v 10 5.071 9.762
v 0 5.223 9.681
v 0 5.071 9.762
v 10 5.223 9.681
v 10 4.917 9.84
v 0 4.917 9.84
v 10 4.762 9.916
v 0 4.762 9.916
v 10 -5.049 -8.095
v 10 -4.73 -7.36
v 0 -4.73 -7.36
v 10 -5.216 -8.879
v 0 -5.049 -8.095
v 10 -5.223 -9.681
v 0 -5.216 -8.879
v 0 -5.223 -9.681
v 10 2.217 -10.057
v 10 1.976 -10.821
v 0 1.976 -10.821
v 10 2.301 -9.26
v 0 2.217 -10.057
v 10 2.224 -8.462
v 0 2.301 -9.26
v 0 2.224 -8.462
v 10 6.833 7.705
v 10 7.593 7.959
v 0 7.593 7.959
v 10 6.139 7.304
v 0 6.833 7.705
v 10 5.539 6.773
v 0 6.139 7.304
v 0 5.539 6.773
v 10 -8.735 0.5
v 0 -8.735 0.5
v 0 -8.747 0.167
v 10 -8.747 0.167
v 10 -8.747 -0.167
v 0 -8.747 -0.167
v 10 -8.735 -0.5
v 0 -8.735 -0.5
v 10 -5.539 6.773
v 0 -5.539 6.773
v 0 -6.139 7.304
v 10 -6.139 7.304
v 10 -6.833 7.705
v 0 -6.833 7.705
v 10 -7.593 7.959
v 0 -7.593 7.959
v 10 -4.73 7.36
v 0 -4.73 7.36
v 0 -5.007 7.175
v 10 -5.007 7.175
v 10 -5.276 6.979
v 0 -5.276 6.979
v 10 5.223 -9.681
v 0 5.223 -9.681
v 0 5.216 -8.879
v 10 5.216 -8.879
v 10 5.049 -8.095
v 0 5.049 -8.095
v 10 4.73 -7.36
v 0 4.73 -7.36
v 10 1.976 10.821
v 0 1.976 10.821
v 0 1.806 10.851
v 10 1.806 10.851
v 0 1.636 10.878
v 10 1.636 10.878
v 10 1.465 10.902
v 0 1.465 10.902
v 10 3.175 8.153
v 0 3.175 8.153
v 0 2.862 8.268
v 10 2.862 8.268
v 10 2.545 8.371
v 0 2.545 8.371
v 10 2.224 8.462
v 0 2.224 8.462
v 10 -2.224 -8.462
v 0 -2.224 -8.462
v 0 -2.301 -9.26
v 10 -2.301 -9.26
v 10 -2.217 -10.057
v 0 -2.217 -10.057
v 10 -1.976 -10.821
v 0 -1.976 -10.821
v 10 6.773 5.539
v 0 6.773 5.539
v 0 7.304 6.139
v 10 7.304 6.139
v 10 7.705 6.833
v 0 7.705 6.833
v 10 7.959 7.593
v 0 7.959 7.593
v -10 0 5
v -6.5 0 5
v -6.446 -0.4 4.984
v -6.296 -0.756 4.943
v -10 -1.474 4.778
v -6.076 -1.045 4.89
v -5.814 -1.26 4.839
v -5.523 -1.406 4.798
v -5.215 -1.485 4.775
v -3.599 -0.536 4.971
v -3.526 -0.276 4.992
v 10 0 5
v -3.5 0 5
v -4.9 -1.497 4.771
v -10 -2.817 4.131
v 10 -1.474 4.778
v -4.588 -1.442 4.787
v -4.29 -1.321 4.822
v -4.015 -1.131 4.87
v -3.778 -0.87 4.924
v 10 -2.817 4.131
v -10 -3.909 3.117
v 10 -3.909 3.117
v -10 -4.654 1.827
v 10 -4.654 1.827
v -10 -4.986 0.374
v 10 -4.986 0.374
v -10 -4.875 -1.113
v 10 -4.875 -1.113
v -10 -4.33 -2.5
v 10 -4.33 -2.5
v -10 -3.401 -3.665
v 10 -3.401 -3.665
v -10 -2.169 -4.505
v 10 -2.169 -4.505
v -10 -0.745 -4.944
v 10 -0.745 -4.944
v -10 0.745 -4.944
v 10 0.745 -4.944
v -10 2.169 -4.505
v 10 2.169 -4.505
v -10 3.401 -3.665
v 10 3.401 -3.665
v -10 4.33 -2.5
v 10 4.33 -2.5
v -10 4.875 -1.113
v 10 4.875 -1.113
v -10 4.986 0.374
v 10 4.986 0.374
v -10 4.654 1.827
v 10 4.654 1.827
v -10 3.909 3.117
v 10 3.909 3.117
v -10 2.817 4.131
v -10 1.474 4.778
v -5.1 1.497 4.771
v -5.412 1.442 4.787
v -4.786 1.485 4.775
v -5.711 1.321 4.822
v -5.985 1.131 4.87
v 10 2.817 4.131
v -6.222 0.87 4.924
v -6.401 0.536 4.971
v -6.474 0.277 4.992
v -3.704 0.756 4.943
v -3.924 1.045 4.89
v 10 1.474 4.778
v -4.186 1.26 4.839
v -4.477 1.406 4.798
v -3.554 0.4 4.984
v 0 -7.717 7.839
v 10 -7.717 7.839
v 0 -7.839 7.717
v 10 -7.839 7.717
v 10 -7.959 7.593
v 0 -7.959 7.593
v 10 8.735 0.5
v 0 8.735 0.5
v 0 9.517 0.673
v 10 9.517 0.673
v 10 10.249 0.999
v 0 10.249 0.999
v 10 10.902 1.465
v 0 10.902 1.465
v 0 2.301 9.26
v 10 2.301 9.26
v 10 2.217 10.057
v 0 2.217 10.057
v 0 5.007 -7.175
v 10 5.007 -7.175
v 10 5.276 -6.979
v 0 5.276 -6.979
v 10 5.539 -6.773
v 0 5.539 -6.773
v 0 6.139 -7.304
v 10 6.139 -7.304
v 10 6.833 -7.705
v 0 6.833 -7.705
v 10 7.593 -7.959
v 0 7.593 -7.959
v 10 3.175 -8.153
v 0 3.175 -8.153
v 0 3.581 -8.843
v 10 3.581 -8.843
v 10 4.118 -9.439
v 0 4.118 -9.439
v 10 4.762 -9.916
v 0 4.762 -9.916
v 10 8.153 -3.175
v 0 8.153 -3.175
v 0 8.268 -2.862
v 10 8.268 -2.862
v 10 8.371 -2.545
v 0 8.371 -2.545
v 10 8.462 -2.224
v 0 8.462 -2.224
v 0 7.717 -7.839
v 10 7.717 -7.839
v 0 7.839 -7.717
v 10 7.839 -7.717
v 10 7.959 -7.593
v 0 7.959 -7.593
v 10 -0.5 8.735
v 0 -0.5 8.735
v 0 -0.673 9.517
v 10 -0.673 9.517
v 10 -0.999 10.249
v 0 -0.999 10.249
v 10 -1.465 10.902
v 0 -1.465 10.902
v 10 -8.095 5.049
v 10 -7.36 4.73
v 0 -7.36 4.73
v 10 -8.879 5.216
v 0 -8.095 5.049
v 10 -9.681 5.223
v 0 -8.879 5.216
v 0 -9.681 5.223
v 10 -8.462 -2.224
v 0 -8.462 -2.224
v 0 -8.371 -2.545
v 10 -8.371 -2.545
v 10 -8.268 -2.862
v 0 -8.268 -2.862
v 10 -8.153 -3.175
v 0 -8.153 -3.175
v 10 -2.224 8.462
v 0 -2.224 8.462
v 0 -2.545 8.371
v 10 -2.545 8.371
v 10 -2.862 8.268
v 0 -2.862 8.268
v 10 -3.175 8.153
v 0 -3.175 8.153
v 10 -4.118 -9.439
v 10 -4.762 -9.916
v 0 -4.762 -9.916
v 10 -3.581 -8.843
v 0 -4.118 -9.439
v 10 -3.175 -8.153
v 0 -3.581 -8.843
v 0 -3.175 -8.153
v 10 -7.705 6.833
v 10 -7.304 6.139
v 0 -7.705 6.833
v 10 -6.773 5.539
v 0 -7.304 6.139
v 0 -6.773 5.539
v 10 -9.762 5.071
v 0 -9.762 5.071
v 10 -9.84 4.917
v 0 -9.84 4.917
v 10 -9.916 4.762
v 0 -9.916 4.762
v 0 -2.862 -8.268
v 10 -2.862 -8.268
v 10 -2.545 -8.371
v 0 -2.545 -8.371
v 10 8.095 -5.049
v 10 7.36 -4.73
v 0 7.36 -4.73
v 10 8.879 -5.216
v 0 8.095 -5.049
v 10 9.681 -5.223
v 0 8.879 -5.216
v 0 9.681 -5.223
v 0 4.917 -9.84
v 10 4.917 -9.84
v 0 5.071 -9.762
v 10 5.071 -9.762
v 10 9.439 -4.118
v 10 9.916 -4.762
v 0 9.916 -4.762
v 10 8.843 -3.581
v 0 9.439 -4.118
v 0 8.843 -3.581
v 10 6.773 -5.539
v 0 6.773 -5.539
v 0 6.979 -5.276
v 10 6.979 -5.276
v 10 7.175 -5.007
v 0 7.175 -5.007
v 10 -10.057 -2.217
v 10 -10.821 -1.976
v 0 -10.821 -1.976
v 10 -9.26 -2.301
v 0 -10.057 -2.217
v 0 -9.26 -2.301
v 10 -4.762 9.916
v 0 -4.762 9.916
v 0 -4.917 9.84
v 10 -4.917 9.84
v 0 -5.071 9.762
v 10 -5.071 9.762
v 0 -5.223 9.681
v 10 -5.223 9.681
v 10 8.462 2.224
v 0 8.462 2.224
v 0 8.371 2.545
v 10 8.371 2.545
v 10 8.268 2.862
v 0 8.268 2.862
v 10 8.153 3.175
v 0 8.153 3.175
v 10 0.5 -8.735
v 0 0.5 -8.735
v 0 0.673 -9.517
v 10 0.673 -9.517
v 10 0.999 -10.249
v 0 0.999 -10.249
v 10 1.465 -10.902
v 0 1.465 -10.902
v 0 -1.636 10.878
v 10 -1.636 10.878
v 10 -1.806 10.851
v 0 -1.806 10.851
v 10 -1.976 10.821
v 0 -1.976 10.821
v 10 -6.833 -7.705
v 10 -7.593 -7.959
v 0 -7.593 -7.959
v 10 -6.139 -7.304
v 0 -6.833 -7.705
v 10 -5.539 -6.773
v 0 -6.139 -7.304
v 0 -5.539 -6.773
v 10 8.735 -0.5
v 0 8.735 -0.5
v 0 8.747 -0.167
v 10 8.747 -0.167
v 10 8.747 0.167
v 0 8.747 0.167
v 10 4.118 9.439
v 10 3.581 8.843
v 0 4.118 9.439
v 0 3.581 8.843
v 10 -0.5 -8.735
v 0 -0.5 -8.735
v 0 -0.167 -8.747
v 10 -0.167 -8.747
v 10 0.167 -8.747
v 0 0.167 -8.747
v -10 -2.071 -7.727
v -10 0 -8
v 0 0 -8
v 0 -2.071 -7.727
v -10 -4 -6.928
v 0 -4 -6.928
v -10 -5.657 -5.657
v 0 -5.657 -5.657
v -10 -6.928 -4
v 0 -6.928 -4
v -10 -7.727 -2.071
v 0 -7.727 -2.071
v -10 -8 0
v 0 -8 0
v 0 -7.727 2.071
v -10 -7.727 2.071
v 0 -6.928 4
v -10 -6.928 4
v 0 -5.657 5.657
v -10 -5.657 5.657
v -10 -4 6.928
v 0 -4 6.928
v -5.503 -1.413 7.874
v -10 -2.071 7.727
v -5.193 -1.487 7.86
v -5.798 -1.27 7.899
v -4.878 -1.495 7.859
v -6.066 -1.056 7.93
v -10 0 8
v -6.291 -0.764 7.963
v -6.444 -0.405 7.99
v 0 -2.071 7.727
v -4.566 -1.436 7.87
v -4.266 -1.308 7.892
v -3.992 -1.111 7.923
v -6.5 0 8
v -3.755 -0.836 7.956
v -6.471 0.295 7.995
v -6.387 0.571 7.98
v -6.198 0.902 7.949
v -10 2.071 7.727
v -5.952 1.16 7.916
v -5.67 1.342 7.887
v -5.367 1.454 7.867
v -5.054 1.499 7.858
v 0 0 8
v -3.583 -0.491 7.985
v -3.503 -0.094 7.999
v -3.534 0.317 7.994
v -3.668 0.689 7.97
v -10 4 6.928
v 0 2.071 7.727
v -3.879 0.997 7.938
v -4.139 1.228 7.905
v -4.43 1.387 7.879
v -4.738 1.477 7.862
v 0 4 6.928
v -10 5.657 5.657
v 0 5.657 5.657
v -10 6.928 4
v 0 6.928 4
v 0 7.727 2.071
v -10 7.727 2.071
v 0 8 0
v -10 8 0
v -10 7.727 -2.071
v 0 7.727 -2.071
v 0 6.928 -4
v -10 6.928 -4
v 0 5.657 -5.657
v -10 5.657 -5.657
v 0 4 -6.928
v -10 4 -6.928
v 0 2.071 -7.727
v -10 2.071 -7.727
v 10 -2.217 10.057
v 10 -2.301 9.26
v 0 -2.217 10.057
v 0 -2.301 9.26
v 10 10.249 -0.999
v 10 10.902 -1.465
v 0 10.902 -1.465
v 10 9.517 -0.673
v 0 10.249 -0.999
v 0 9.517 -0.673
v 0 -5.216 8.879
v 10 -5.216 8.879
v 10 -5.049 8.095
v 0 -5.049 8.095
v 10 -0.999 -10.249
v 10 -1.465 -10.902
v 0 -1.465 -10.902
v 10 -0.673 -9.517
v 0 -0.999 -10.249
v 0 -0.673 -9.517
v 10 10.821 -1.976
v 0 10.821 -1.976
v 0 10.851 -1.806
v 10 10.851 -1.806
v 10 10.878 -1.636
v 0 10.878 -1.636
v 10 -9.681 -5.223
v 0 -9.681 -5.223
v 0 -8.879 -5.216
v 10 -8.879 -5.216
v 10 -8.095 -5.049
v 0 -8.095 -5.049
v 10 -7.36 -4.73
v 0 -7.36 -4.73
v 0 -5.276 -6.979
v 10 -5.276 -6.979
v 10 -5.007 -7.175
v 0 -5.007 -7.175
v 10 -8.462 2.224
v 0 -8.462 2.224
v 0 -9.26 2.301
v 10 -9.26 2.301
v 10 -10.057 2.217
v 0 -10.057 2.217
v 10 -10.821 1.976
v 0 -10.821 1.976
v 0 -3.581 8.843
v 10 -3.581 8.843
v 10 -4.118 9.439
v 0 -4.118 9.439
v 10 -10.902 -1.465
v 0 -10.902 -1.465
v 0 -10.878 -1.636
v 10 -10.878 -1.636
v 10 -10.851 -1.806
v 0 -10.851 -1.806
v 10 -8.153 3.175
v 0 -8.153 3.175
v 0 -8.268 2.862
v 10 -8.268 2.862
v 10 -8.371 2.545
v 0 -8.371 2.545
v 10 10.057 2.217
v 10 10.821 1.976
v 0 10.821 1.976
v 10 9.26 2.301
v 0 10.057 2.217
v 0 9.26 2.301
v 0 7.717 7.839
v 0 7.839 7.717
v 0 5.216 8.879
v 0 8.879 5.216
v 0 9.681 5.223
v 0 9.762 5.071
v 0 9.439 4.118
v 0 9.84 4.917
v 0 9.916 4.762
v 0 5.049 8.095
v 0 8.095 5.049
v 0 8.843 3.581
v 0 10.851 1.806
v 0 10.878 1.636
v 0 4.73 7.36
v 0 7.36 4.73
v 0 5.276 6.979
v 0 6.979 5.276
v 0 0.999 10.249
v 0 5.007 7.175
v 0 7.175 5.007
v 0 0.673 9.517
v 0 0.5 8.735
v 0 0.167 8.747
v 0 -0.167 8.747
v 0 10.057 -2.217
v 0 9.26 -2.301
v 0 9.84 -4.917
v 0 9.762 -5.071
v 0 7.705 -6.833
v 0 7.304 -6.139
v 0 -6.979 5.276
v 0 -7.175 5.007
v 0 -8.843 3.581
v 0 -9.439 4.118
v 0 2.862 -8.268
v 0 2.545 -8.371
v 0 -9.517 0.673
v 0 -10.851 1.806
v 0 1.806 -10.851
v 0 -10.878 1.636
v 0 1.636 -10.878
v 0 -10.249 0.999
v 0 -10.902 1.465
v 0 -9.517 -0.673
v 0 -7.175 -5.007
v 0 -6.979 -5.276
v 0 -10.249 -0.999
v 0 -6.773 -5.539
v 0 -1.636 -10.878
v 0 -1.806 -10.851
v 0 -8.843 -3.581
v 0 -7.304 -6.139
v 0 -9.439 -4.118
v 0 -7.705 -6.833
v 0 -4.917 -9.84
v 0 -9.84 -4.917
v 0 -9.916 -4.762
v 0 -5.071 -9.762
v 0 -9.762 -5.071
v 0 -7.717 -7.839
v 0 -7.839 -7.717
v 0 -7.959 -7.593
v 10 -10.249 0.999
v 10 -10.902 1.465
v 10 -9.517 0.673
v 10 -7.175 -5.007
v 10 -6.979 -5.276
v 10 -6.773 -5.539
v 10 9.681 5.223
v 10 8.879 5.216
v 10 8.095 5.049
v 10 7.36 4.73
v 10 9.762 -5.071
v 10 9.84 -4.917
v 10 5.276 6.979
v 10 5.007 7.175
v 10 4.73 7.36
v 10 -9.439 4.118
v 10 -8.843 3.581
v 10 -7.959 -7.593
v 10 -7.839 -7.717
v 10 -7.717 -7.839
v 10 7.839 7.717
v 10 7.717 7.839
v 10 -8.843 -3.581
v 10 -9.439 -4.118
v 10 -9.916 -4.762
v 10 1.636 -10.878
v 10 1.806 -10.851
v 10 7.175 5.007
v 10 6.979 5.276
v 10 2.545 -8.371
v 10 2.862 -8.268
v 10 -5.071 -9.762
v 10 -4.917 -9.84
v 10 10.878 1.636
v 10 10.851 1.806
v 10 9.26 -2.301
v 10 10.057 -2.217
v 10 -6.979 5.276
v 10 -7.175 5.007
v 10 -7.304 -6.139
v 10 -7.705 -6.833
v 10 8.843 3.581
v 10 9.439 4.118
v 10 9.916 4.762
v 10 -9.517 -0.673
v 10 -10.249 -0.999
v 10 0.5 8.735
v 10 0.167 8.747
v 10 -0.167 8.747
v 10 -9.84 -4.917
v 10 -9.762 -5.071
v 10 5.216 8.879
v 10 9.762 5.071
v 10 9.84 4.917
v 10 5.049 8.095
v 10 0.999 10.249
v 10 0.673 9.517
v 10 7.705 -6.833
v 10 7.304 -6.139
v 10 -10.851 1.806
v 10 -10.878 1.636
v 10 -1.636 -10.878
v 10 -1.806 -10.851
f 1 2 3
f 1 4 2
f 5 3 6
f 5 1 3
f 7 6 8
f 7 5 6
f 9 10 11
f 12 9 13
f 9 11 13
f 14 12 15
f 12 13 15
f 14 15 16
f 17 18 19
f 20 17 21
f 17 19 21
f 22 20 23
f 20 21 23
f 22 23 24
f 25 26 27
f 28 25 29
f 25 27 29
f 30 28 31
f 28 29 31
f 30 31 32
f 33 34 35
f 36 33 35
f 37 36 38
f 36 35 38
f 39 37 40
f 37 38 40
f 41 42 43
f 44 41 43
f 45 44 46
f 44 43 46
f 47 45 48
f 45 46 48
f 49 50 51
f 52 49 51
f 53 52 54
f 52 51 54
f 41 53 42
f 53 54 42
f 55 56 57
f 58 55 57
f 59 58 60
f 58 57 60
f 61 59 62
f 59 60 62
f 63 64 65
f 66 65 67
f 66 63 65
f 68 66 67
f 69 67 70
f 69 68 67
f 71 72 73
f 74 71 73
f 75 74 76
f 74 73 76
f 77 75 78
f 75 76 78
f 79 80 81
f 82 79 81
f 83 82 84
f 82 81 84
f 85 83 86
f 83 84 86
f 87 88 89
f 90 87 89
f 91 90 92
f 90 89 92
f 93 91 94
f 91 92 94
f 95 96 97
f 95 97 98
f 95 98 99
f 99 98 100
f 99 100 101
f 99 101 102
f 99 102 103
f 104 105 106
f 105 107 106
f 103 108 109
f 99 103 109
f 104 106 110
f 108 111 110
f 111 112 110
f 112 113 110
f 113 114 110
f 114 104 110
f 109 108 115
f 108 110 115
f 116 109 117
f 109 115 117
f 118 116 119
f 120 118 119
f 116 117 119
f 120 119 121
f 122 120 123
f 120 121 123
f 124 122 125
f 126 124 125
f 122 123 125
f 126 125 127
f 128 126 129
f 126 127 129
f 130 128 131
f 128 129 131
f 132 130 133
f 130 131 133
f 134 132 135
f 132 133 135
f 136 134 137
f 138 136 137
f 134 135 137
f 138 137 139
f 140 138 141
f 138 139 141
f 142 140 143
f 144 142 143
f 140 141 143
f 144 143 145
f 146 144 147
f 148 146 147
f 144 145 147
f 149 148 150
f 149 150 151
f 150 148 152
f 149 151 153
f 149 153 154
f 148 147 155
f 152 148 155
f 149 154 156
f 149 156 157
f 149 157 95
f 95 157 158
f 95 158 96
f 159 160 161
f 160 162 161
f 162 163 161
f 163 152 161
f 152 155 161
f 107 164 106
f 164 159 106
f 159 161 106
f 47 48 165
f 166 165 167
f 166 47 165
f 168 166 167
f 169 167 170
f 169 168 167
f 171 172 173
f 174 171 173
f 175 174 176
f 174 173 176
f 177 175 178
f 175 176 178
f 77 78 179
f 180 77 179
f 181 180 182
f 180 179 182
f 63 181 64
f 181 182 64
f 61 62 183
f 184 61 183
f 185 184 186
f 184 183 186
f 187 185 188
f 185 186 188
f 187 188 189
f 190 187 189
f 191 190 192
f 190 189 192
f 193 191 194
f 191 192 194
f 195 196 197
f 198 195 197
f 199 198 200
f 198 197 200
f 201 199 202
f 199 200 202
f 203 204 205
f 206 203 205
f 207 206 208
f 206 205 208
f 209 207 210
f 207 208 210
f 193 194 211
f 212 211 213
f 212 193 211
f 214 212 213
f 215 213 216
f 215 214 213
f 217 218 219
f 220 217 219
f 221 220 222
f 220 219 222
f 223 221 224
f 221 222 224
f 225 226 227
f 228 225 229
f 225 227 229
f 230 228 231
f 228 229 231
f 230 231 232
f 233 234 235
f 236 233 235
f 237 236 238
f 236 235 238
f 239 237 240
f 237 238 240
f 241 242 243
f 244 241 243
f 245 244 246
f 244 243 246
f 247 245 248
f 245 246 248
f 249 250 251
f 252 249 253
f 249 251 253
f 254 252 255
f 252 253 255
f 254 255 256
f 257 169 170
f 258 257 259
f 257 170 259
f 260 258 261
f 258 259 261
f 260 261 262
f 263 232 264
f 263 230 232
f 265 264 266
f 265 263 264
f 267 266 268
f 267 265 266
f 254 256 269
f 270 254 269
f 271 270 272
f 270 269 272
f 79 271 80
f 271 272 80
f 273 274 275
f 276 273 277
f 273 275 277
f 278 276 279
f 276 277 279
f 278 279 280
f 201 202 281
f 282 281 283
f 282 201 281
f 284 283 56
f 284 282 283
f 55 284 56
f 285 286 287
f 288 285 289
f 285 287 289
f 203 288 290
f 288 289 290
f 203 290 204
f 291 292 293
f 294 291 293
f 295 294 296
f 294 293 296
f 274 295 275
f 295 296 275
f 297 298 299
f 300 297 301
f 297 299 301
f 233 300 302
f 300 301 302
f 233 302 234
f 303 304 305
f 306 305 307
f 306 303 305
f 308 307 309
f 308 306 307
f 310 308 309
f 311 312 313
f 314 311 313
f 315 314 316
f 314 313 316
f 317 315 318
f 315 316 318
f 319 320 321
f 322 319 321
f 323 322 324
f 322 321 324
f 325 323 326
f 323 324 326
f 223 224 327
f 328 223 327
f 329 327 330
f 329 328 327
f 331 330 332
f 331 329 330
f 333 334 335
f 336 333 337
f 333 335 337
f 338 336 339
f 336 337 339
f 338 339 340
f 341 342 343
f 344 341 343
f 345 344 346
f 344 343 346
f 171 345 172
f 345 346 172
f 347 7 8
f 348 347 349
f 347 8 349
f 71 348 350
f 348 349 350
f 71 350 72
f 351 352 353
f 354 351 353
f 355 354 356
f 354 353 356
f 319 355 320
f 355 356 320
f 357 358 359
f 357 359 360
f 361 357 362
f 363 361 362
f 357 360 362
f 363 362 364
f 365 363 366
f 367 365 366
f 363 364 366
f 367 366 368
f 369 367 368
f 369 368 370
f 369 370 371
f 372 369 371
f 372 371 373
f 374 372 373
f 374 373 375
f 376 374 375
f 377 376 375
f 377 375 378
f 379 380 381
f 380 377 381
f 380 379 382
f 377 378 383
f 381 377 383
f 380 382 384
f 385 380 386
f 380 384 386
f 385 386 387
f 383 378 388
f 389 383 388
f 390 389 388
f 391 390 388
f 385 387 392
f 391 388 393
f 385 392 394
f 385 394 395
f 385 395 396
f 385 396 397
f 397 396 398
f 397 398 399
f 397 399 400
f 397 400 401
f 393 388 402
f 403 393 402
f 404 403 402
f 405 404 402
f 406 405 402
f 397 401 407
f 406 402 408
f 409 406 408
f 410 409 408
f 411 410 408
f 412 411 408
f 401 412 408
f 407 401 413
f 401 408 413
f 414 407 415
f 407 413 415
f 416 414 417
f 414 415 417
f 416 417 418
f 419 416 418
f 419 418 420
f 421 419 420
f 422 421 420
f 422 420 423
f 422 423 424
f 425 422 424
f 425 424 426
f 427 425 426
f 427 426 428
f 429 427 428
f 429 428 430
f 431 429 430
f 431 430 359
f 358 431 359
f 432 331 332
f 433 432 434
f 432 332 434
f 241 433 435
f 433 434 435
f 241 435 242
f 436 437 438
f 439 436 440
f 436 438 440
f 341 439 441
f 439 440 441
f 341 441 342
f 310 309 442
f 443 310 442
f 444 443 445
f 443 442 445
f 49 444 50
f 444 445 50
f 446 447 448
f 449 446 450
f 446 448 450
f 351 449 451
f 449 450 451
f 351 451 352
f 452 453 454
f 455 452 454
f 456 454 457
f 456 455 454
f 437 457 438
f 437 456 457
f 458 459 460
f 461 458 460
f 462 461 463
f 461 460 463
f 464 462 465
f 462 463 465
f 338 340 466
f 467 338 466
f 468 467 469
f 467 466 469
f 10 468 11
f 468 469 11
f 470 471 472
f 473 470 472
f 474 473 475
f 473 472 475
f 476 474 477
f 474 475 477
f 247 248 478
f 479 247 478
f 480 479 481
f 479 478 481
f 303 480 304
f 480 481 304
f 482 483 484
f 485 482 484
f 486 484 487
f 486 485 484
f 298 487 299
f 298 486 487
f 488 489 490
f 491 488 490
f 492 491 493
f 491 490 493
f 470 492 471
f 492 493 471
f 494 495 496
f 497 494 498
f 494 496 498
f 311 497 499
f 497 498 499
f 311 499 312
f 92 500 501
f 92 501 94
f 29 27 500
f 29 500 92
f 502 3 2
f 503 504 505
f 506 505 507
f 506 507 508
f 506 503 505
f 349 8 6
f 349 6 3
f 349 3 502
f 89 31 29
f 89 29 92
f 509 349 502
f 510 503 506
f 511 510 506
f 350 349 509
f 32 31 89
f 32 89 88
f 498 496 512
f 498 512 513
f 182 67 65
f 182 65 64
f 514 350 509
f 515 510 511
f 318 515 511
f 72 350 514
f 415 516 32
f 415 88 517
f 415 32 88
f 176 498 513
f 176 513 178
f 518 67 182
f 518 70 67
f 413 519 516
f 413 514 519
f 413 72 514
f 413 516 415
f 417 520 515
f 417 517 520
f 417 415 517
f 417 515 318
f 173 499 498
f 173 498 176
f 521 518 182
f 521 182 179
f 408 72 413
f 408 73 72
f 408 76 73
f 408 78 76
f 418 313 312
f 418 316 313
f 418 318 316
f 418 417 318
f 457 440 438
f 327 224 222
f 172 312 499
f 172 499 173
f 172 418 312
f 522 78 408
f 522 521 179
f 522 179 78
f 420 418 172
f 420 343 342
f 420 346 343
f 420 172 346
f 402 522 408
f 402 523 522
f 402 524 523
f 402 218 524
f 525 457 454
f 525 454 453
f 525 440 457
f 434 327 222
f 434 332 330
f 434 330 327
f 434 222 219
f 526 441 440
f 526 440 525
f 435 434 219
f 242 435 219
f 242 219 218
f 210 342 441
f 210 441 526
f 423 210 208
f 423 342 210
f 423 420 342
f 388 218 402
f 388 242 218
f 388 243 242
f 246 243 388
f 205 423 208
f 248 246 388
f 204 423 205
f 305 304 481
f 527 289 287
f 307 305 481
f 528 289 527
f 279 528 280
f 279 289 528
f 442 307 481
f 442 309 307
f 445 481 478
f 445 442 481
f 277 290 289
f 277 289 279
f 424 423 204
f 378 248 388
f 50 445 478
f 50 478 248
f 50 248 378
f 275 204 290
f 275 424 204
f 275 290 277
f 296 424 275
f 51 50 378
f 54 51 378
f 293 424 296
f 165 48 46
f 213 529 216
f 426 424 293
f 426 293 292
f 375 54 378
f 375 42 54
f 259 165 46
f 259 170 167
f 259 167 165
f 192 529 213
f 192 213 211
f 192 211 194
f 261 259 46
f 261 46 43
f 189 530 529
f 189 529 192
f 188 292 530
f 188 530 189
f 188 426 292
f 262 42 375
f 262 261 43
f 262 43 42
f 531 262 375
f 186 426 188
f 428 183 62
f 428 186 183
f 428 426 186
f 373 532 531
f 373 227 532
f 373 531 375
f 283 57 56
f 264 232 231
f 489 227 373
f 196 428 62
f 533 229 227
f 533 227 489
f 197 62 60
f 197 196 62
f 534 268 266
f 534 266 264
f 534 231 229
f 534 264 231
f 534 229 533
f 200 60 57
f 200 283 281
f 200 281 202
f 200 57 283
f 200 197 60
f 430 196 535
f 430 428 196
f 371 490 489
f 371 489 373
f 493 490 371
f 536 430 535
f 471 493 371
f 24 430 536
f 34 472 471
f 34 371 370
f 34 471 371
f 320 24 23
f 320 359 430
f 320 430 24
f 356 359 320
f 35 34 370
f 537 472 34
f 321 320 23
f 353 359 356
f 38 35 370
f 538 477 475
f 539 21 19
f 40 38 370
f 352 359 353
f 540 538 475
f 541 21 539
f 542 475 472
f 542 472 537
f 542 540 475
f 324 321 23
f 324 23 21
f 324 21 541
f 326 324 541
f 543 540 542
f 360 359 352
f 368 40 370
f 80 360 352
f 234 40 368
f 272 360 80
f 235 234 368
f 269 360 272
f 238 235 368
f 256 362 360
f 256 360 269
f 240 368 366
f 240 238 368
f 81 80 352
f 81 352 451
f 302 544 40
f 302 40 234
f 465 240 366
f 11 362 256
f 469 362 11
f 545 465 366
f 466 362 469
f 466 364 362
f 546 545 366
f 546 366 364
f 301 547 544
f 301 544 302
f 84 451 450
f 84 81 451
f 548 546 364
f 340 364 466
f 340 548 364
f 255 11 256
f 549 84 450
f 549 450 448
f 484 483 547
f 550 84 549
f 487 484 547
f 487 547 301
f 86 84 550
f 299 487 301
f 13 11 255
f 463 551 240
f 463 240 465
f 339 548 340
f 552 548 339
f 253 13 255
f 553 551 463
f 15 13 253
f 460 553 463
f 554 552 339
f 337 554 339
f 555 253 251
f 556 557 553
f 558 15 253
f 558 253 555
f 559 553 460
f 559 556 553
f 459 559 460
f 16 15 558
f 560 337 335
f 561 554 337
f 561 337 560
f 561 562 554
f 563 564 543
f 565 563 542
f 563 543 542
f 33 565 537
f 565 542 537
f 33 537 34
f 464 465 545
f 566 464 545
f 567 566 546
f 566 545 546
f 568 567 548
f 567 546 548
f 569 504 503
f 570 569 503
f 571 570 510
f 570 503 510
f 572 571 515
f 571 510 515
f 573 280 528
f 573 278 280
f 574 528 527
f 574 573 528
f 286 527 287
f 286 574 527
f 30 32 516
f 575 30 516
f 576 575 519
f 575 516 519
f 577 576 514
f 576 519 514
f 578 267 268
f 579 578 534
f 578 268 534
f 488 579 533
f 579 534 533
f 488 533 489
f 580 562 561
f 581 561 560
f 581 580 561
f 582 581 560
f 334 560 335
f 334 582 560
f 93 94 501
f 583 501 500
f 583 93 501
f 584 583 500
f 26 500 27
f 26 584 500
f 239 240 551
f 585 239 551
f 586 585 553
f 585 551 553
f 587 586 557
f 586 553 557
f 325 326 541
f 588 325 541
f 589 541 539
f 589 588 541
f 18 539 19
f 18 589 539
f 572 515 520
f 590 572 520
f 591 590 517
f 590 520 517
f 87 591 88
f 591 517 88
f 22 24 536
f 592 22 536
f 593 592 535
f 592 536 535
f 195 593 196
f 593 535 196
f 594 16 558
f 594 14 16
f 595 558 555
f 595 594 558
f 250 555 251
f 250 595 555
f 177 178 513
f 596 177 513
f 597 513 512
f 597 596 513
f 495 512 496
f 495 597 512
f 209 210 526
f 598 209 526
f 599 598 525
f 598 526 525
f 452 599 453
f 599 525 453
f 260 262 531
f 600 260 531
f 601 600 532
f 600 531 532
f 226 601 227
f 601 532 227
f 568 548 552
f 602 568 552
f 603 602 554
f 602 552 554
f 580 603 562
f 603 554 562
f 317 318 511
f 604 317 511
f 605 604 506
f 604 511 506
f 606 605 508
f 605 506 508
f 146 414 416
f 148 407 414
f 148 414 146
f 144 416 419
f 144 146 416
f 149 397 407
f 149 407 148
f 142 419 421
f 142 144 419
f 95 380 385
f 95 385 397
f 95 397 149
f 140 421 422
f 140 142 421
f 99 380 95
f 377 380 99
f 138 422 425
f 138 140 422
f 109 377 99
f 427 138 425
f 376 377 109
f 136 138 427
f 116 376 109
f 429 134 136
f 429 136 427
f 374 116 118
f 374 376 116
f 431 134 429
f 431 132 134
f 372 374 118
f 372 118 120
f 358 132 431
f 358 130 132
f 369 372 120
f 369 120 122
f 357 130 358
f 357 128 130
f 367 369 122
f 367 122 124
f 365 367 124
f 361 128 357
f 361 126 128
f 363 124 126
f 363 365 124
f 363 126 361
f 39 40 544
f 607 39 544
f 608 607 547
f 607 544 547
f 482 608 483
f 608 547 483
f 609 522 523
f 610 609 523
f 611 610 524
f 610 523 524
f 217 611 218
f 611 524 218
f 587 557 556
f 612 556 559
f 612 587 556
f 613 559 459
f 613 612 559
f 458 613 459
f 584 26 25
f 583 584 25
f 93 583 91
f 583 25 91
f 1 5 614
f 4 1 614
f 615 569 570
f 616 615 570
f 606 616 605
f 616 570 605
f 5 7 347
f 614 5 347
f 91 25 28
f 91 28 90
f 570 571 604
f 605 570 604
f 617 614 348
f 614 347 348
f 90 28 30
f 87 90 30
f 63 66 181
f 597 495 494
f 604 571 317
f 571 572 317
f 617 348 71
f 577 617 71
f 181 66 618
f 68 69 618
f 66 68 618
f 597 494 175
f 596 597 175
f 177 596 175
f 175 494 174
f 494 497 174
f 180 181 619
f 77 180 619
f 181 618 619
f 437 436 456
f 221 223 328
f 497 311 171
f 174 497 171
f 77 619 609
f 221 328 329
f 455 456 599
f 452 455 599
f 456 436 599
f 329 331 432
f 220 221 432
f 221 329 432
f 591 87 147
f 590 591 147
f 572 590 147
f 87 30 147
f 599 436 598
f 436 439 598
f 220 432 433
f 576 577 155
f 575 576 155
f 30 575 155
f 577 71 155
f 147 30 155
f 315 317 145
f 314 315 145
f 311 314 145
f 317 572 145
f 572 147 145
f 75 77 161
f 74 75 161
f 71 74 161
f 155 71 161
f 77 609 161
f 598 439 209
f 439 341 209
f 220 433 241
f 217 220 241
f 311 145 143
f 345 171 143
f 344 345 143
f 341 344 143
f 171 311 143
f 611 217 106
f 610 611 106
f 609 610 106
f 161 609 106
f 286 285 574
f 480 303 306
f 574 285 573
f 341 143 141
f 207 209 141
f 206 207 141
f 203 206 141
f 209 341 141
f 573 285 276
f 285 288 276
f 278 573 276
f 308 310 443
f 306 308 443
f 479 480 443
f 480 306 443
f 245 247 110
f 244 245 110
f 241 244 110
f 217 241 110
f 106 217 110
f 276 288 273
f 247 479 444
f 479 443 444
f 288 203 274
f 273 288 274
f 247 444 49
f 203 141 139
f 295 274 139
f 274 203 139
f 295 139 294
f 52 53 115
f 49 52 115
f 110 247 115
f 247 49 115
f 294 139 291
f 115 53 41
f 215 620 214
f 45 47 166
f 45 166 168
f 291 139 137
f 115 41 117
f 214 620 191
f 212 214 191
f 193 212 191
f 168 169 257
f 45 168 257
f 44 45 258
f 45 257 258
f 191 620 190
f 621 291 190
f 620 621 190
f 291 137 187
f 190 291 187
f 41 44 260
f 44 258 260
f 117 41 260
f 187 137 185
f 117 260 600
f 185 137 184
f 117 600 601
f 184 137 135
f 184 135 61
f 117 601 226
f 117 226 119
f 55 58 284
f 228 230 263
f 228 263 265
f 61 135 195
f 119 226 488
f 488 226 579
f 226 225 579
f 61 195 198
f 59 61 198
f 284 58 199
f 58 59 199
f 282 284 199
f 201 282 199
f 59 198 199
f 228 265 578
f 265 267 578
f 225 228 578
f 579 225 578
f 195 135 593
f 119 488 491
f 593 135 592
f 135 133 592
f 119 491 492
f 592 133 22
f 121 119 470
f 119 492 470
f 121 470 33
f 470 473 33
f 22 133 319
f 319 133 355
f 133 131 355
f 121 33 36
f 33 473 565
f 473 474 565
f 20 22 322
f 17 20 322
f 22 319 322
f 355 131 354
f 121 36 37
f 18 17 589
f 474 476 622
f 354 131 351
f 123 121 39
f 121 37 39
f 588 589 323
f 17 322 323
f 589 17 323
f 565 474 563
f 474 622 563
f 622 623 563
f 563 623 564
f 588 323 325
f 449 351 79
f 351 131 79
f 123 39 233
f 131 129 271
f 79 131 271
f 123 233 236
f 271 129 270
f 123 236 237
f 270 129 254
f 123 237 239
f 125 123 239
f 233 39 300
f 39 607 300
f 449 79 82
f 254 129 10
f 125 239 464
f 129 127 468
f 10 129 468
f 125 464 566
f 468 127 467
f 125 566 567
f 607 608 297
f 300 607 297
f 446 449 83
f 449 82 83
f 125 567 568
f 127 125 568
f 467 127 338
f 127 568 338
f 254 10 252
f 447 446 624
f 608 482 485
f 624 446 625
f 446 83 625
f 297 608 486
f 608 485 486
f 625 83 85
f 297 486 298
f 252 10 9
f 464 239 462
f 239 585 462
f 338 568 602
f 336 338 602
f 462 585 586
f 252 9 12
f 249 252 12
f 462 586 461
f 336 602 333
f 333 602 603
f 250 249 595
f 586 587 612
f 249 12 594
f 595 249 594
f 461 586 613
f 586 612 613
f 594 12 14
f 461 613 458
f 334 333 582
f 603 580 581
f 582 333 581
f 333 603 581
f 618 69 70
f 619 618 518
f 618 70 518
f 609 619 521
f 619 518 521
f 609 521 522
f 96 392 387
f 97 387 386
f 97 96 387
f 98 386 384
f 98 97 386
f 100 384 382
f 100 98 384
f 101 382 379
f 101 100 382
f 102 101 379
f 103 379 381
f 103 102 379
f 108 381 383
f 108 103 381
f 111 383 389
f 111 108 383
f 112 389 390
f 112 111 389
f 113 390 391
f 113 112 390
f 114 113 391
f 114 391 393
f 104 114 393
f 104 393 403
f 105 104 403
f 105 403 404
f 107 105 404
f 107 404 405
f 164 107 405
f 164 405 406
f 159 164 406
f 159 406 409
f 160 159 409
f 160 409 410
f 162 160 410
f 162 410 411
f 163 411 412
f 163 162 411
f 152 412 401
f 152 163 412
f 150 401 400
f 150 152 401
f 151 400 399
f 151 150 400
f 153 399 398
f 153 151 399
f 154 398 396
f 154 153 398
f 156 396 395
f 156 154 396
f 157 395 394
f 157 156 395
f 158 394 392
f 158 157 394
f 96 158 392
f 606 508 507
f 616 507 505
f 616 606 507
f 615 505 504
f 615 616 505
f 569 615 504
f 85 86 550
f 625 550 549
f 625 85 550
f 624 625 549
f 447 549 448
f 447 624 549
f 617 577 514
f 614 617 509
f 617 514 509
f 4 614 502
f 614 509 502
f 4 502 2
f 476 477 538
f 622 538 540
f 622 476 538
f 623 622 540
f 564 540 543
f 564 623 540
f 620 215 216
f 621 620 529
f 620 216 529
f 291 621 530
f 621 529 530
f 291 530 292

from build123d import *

# Parameters (mm, degrees)
BASPROSKE_W              = 10
BASPROSKE_H              = 11
TOOTHCUT_DEPTH           = 19.493242009
TEETHCUTS_COUNT          = 20
TEETHCUTS_ANGLE          = 342
HUBNEAONESKE_R           = 8
HUBNEARONE_DEPTH         = 10.0000508
BORSKE_R                 = 5
BORE_DEPTH               = 20.0000508
SKETCH_1_R               = 1.5
CUT_EXTRUDE_1_DEPTH      = 9
CUT_EXTRUDE_1_DEPTH_BACK = 1


with BuildPart() as part:
    # BasProSke → Base-Revolve (revolve)
    with BuildSketch(Plane(origin=(0, 0, 0), x_dir=(1, 0, 0), z_dir=(0, 1, 0)), mode=Mode.PRIVATE) as base_revolve_sk:
        with Locations((5, 5.5)):
            Rectangle(BASPROSKE_W, BASPROSKE_H)
    revolve(base_revolve_sk.sketch.rotate(Axis((-10, 0, 0), (1, 0, 0)), 180), axis=Axis((-10, 0, 0), (1, 0, 0)))

    # TooCutSke → ToothCut (cut, through all)
    with BuildSketch(Plane(origin=(0, 0, 0), x_dir=(0, 0, -1), z_dir=(1, 0, 0))):
        with BuildLine():
            ThreePointArc((0.499924007, 8.734705318), (0, 8.749), (-0.499924007, 8.734705318))
            ThreePointArc((-0.499924007, 8.734705318), (-0.824302243, 9.905497836), (-1.485192705, 10.924909509))
            ThreePointArc((-1.485192705, 10.924909509), (0, 11.0254), (1.485192705, 10.924909509))
            ThreePointArc((1.485192705, 10.924909509), (0.824302243, 9.905497836), (0.499924007, 8.734705318))
        make_face()
    toothcut = extrude(amount=TOOTHCUT_DEPTH, mode=Mode.SUBTRACT)

    # TeethCuts: ToothCut ×20 about axis
    teethcuts_axis = Axis((-10, 0, 0), (1, 0, 0))
    for i in range(1, TEETHCUTS_COUNT):
        add(toothcut.rotate(teethcuts_axis, i * TEETHCUTS_ANGLE / (TEETHCUTS_COUNT - 1)), mode=Mode.SUBTRACT)

    # HubNeaOneSke → HubNearOne (add)
    with BuildSketch(Plane.ZY):
        with Locations(Location((0, 0, 0), (0, 0, 180))):
            Circle(HUBNEAONESKE_R)
    extrude(amount=HUBNEARONE_DEPTH)

    # BorSke → Bore (cut, symmetric)
    with BuildSketch(Plane(origin=(0, 0, 0), x_dir=(0, 0, -1), z_dir=(1, 0, 0))):
        with Locations(Location((0, 0, 0), (0, 0, 180))):
            Circle(BORSKE_R)
    extrude(amount=BORE_DEPTH, both=True, mode=Mode.SUBTRACT)

    # 草图1 → 切除-拉伸1 (cut, two sides)
    with BuildSketch(Plane.XY) as cut_extrude_1_sk:
        with Locations(Location((-5.0000508, 0, 0), (0, 0, 180.000000001))):
            Circle(SKETCH_1_R)
    extrude(amount=CUT_EXTRUDE_1_DEPTH, mode=Mode.SUBTRACT)
    extrude(cut_extrude_1_sk.sketch, amount=-CUT_EXTRUDE_1_DEPTH_BACK, mode=Mode.SUBTRACT)


solid = part.part
